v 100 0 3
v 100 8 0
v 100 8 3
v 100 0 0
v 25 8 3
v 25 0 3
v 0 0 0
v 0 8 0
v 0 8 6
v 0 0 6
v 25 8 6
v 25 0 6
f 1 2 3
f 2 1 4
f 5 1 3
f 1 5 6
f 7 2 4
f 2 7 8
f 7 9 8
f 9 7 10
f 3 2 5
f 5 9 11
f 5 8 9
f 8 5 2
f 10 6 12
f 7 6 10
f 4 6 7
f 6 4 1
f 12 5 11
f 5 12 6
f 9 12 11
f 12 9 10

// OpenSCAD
/*
 * a toggle for my easy bag
 */

$fn=50;

stem_length=100;
stem_width=8;
stem_thickness=3;

module stem() {
   cube([stem_length, stem_width, stem_thickness]);
}

module stem_end() {
   translate([0, 0, stem_thickness])
      #cube([stem_length/4, stem_width, stem_thickness]);
}

stem();
stem_end();
